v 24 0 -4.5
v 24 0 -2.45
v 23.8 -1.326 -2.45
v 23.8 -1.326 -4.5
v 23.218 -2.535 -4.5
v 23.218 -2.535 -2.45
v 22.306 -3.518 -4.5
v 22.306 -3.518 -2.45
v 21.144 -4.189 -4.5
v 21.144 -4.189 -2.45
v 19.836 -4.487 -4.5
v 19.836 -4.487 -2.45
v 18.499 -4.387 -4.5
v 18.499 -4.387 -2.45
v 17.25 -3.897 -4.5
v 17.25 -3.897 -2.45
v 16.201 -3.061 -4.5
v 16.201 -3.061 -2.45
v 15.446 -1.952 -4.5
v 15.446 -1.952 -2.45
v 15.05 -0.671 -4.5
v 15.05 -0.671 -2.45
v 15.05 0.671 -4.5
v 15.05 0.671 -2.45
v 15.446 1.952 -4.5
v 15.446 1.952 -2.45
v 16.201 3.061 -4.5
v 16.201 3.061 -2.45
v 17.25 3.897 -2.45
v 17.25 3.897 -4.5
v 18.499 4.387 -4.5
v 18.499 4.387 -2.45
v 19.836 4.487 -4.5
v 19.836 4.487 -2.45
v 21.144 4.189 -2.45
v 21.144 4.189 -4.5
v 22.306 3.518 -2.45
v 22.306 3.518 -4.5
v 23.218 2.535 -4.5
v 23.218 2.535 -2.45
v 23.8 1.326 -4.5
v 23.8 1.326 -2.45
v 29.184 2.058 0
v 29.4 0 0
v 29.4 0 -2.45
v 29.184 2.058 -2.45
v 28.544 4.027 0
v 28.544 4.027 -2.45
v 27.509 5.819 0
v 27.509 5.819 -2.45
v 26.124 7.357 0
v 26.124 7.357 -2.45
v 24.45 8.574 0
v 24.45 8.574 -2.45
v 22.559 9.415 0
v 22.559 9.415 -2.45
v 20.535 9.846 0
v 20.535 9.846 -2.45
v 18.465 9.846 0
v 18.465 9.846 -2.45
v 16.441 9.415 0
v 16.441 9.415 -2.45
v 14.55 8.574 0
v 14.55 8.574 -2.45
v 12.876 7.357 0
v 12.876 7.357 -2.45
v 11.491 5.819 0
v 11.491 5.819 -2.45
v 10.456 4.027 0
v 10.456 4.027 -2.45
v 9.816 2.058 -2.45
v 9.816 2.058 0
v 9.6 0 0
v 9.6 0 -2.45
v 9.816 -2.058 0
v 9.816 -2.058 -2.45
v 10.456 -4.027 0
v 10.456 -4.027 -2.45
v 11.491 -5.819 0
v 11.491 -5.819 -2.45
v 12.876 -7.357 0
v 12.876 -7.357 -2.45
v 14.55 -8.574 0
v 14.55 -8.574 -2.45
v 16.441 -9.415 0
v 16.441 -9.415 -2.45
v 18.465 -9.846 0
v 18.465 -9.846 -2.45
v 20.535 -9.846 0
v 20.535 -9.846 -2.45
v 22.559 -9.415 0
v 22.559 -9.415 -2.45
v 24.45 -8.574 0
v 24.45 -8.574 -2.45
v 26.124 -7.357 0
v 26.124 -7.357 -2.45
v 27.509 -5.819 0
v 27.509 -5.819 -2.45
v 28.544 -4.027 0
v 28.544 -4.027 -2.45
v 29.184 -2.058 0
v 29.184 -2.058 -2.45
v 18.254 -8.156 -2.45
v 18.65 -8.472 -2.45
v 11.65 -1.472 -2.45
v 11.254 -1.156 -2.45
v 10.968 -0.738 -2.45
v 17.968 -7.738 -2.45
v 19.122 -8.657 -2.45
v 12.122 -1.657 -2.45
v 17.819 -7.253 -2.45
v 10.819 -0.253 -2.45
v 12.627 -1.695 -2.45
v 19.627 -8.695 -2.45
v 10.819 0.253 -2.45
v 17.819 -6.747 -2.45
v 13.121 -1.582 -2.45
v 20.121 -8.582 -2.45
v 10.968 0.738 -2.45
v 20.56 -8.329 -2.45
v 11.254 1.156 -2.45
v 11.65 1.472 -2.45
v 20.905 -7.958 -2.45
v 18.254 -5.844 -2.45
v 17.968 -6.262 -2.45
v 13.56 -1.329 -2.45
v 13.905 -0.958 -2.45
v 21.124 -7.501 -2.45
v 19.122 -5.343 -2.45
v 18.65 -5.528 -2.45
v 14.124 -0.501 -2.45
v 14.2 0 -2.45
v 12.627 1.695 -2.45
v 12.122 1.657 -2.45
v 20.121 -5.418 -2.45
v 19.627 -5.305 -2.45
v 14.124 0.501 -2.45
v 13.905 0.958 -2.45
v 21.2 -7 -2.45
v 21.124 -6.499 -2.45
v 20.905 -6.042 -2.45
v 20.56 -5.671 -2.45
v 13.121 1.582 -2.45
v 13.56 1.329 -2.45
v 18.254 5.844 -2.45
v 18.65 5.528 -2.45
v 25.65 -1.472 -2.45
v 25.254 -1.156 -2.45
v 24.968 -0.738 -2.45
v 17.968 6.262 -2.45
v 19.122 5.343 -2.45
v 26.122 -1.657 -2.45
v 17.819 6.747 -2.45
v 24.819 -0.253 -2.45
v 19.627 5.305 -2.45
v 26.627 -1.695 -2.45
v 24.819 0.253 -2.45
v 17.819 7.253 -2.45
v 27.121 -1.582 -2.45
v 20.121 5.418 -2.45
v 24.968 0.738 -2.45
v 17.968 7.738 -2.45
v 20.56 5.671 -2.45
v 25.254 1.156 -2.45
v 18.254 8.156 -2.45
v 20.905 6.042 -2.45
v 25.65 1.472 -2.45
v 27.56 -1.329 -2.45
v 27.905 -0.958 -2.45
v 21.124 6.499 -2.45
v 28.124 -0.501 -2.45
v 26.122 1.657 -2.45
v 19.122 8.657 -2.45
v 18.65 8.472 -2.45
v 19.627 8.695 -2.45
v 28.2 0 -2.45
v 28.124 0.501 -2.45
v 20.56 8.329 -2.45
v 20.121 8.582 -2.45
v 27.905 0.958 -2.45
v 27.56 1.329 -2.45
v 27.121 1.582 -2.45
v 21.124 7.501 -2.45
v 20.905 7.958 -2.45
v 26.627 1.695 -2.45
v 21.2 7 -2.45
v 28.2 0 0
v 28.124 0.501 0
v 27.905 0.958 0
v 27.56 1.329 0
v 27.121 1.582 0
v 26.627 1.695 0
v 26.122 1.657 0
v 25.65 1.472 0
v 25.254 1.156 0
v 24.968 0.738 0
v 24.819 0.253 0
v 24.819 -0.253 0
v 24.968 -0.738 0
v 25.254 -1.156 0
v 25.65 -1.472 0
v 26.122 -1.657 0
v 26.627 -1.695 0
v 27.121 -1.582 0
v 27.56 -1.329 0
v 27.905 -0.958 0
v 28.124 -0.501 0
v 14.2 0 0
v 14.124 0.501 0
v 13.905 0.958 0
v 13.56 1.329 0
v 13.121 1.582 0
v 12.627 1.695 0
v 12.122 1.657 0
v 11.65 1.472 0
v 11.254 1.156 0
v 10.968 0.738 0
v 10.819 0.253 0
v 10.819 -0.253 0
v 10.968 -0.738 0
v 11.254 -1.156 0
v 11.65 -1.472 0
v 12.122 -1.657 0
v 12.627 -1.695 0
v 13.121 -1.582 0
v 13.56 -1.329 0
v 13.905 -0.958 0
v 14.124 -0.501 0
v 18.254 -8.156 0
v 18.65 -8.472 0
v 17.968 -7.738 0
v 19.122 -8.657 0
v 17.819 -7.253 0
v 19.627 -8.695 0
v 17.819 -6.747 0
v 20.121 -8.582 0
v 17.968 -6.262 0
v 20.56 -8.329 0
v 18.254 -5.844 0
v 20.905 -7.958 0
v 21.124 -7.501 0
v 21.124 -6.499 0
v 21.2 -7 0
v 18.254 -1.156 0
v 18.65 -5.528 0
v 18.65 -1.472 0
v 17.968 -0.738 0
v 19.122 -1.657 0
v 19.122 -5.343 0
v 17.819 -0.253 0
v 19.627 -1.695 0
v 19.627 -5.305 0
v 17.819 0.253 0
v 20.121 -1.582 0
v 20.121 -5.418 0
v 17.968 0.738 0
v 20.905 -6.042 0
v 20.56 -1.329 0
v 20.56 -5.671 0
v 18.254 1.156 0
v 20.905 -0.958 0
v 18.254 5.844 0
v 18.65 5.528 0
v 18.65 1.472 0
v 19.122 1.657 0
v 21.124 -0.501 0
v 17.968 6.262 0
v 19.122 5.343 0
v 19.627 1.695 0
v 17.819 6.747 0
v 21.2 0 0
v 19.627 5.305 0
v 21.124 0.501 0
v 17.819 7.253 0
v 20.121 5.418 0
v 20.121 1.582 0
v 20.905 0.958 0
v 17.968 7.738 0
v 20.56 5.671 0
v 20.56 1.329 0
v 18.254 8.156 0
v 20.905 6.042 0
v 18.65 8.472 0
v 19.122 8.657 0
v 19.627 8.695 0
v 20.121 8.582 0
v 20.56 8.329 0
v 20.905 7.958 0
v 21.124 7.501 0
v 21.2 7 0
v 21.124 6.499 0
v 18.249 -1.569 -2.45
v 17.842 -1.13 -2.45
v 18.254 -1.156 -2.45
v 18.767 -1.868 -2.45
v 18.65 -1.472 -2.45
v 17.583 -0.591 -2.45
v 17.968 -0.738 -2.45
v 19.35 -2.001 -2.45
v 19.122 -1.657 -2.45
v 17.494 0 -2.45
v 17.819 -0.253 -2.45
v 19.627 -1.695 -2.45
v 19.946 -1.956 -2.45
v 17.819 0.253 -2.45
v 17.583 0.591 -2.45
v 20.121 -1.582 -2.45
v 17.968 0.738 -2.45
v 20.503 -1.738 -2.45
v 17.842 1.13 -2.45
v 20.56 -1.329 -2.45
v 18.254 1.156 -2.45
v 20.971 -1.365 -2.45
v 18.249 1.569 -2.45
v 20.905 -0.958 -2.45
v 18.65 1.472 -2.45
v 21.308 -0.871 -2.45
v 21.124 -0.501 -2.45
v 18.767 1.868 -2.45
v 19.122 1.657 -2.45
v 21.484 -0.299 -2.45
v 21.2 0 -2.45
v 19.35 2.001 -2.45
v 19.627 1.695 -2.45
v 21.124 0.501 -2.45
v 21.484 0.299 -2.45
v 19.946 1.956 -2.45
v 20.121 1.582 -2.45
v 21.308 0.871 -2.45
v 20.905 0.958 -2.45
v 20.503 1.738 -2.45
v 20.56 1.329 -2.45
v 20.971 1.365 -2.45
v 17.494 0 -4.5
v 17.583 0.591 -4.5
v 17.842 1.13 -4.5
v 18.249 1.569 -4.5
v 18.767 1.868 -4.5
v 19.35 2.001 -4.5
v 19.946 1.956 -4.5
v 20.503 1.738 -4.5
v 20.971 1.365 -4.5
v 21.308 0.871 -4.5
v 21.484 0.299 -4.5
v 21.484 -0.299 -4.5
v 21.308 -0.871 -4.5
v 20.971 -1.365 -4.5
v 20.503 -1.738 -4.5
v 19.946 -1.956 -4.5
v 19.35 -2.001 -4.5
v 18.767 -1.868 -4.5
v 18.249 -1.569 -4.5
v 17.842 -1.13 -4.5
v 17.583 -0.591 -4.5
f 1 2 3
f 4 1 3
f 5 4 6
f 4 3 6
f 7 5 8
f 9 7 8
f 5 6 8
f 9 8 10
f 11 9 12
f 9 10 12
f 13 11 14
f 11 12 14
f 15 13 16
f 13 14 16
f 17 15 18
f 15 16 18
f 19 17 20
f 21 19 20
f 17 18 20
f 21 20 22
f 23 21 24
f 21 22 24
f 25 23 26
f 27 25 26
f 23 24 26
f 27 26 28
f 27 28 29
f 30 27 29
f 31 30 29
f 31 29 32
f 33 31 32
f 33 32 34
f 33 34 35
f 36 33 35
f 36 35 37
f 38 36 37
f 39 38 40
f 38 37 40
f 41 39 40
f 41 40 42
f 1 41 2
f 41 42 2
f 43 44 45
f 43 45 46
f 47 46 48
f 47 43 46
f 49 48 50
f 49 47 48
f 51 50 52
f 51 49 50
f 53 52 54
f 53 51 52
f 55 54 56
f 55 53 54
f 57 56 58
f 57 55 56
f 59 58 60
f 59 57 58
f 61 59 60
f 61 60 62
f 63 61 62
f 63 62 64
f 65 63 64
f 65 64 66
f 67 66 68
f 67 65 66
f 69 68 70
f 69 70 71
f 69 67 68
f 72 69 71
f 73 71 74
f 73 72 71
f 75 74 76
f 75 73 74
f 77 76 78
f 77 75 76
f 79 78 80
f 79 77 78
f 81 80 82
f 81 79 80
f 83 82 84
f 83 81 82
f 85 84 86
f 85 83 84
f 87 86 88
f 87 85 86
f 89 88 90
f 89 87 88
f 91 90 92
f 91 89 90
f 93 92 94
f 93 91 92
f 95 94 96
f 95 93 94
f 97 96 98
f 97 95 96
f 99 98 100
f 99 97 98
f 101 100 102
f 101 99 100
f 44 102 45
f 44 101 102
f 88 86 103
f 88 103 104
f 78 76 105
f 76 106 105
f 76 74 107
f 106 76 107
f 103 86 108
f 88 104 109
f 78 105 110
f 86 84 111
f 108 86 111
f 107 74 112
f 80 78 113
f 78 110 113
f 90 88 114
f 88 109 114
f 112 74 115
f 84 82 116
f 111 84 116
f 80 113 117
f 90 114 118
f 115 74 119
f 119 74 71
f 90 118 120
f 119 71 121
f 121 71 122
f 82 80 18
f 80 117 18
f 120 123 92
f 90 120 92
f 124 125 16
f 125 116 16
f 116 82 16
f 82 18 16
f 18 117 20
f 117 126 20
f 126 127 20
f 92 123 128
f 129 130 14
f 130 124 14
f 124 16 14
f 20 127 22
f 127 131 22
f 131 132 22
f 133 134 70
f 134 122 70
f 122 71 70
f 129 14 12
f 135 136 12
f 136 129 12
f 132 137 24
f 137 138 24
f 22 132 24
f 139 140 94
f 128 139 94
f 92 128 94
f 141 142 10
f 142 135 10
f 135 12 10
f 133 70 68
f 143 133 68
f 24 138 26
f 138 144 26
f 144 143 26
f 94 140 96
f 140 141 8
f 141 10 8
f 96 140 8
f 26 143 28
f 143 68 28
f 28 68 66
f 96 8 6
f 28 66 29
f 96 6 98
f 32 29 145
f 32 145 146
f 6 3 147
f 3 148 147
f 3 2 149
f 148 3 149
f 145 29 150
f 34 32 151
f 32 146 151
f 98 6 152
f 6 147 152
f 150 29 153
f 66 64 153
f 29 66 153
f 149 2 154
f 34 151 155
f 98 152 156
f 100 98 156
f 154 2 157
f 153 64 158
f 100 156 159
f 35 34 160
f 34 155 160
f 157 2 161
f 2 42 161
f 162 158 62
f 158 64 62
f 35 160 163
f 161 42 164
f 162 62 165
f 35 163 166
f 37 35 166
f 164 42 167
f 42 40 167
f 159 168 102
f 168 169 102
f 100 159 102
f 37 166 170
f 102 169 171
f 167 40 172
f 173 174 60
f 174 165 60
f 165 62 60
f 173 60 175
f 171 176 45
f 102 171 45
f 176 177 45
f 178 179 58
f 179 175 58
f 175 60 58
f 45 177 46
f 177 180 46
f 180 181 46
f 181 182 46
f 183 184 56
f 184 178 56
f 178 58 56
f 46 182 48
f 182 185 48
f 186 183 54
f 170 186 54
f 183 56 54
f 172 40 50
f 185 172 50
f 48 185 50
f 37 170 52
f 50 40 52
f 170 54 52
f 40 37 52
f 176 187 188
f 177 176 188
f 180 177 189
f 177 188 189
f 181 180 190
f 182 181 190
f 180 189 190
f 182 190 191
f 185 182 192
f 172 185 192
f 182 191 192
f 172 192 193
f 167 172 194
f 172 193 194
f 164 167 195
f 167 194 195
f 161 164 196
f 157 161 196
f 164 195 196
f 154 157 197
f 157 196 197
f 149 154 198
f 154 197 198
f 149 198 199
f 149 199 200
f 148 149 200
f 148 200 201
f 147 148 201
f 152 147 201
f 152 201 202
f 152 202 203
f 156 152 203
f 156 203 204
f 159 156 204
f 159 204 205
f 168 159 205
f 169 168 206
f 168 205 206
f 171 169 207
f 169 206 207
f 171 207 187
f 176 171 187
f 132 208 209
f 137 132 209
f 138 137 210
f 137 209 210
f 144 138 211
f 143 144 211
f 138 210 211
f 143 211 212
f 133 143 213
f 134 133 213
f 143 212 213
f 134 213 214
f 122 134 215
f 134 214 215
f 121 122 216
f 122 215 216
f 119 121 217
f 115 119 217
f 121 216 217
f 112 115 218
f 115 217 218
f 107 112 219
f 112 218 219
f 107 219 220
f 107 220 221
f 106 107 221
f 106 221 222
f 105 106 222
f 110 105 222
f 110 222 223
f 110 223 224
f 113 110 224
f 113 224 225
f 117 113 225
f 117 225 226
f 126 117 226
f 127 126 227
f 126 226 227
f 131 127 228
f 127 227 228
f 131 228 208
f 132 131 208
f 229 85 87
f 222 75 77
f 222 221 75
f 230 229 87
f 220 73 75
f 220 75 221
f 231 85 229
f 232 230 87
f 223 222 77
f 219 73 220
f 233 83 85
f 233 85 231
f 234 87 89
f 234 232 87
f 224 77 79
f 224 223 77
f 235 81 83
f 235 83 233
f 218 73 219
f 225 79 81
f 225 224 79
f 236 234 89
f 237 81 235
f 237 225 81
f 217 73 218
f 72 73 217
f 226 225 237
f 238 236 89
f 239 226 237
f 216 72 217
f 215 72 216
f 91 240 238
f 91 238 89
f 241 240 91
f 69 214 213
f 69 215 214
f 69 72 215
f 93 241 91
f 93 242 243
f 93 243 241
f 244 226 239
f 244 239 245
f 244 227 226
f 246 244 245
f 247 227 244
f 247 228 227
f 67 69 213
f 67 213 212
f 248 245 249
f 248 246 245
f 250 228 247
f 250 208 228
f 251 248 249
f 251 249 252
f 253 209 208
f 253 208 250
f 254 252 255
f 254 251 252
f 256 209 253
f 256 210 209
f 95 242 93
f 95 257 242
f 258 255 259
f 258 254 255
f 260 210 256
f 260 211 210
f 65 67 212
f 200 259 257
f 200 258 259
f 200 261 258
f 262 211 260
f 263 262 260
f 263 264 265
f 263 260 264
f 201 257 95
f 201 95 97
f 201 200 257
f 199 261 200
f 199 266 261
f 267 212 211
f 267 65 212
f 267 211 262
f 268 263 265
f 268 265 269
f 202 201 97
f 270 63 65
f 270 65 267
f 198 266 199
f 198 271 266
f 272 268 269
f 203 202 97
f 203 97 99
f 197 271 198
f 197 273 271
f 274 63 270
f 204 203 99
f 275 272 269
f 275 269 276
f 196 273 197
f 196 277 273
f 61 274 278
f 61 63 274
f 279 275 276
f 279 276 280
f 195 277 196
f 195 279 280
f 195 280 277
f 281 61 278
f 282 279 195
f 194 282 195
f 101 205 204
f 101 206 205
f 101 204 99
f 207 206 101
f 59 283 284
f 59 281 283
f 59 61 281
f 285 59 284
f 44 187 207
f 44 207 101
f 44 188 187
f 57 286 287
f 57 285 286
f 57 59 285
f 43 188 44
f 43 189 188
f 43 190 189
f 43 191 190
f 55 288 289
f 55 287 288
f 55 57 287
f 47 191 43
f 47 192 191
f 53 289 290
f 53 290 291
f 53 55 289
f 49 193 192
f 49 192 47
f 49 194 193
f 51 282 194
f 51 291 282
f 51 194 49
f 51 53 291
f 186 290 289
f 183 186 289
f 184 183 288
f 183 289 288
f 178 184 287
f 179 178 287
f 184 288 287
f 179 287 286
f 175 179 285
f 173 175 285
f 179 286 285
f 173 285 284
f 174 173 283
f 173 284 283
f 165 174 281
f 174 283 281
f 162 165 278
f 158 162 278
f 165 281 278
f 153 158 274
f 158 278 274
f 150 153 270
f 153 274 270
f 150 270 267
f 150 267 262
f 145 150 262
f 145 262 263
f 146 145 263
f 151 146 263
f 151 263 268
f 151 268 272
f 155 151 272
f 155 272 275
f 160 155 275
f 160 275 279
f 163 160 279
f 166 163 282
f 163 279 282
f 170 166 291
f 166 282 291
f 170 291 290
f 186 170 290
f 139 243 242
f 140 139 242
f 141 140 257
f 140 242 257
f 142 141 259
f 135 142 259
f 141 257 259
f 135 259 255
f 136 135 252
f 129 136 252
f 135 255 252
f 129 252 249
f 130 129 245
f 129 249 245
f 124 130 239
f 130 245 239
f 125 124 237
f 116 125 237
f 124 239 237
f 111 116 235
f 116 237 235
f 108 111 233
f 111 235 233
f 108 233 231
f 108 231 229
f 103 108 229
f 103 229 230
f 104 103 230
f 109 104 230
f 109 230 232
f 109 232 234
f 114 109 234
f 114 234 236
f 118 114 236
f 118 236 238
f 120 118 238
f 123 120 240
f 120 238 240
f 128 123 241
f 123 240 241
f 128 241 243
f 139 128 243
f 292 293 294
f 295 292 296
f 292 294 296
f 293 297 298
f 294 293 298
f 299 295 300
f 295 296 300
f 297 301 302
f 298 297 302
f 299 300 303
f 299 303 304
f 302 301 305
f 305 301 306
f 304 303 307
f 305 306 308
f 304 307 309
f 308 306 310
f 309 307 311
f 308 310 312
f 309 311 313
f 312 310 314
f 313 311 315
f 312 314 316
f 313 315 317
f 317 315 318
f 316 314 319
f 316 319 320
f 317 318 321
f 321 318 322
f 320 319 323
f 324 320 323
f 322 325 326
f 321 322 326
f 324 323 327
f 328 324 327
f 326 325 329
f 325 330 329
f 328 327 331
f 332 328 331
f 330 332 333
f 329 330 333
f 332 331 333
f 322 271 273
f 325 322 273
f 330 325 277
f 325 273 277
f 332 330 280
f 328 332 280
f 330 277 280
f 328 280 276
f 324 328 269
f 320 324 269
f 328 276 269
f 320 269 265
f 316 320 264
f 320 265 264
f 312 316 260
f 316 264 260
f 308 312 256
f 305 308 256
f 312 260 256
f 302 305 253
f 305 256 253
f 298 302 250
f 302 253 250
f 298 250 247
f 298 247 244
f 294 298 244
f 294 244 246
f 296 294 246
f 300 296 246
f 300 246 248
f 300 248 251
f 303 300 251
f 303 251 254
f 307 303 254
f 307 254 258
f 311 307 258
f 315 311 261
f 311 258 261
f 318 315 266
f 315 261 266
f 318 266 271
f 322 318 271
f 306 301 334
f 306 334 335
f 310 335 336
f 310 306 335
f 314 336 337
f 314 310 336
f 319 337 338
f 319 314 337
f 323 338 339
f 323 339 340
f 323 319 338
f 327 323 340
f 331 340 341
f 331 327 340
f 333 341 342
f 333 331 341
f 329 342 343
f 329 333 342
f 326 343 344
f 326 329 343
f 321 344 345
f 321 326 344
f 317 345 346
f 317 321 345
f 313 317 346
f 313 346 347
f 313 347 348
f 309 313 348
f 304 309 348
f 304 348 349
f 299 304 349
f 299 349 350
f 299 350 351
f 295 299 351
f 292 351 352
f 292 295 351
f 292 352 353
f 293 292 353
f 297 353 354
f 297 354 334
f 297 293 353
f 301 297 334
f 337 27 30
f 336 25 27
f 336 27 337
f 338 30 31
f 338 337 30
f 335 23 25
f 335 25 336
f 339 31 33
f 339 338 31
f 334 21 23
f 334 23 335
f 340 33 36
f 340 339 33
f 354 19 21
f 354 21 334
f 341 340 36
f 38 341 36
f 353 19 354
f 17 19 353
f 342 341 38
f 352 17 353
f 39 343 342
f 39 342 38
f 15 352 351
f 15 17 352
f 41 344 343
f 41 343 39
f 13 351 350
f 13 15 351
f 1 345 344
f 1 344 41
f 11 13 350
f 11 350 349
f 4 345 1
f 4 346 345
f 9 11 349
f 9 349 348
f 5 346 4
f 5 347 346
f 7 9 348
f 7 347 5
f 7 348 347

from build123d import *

# Parameters (mm, degrees)
SKETCH1_R           = 9.9
SKETCH1_R_2         = 1.7
BOSS_EXTRUDE2_DEPTH = 2.45
SKETCH2_R           = 4.5
SKETCH2_R_2         = 2.006415725
BOSS_EXTRUDE3_DEPTH = 2.05


with BuildPart() as part:
    # Sketch1 → Boss-Extrude2 (new body)
    with BuildSketch(Plane.XY):
        with Locations((19.5, 0)):
            Circle(SKETCH1_R)
        with Locations((19.5, 0)):
            Circle(SKETCH1_R_2, mode=Mode.SUBTRACT)
        with Locations((12.5, 0)):
            Circle(SKETCH1_R_2, mode=Mode.SUBTRACT)
        with Locations((19.5, 7)):
            Circle(SKETCH1_R_2, mode=Mode.SUBTRACT)
        with Locations((26.5, 0)):
            Circle(SKETCH1_R_2, mode=Mode.SUBTRACT)
        with Locations((19.5, -7)):
            Circle(SKETCH1_R_2, mode=Mode.SUBTRACT)
    extrude(amount=-BOSS_EXTRUDE2_DEPTH)

    # Sketch2 → Boss-Extrude3 (add)
    with BuildSketch(Plane(origin=(0, 0, -2.45), x_dir=(-1, 0, 0), z_dir=(0, 0, -1))):
        with Locations(Location((-19.5, 0, 0), (0, 0, 180))):
            Circle(SKETCH2_R)
        with Locations((-19.5, 0)):
            Circle(SKETCH2_R_2, mode=Mode.SUBTRACT)
    extrude(amount=BOSS_EXTRUDE3_DEPTH)


solid = part.part
